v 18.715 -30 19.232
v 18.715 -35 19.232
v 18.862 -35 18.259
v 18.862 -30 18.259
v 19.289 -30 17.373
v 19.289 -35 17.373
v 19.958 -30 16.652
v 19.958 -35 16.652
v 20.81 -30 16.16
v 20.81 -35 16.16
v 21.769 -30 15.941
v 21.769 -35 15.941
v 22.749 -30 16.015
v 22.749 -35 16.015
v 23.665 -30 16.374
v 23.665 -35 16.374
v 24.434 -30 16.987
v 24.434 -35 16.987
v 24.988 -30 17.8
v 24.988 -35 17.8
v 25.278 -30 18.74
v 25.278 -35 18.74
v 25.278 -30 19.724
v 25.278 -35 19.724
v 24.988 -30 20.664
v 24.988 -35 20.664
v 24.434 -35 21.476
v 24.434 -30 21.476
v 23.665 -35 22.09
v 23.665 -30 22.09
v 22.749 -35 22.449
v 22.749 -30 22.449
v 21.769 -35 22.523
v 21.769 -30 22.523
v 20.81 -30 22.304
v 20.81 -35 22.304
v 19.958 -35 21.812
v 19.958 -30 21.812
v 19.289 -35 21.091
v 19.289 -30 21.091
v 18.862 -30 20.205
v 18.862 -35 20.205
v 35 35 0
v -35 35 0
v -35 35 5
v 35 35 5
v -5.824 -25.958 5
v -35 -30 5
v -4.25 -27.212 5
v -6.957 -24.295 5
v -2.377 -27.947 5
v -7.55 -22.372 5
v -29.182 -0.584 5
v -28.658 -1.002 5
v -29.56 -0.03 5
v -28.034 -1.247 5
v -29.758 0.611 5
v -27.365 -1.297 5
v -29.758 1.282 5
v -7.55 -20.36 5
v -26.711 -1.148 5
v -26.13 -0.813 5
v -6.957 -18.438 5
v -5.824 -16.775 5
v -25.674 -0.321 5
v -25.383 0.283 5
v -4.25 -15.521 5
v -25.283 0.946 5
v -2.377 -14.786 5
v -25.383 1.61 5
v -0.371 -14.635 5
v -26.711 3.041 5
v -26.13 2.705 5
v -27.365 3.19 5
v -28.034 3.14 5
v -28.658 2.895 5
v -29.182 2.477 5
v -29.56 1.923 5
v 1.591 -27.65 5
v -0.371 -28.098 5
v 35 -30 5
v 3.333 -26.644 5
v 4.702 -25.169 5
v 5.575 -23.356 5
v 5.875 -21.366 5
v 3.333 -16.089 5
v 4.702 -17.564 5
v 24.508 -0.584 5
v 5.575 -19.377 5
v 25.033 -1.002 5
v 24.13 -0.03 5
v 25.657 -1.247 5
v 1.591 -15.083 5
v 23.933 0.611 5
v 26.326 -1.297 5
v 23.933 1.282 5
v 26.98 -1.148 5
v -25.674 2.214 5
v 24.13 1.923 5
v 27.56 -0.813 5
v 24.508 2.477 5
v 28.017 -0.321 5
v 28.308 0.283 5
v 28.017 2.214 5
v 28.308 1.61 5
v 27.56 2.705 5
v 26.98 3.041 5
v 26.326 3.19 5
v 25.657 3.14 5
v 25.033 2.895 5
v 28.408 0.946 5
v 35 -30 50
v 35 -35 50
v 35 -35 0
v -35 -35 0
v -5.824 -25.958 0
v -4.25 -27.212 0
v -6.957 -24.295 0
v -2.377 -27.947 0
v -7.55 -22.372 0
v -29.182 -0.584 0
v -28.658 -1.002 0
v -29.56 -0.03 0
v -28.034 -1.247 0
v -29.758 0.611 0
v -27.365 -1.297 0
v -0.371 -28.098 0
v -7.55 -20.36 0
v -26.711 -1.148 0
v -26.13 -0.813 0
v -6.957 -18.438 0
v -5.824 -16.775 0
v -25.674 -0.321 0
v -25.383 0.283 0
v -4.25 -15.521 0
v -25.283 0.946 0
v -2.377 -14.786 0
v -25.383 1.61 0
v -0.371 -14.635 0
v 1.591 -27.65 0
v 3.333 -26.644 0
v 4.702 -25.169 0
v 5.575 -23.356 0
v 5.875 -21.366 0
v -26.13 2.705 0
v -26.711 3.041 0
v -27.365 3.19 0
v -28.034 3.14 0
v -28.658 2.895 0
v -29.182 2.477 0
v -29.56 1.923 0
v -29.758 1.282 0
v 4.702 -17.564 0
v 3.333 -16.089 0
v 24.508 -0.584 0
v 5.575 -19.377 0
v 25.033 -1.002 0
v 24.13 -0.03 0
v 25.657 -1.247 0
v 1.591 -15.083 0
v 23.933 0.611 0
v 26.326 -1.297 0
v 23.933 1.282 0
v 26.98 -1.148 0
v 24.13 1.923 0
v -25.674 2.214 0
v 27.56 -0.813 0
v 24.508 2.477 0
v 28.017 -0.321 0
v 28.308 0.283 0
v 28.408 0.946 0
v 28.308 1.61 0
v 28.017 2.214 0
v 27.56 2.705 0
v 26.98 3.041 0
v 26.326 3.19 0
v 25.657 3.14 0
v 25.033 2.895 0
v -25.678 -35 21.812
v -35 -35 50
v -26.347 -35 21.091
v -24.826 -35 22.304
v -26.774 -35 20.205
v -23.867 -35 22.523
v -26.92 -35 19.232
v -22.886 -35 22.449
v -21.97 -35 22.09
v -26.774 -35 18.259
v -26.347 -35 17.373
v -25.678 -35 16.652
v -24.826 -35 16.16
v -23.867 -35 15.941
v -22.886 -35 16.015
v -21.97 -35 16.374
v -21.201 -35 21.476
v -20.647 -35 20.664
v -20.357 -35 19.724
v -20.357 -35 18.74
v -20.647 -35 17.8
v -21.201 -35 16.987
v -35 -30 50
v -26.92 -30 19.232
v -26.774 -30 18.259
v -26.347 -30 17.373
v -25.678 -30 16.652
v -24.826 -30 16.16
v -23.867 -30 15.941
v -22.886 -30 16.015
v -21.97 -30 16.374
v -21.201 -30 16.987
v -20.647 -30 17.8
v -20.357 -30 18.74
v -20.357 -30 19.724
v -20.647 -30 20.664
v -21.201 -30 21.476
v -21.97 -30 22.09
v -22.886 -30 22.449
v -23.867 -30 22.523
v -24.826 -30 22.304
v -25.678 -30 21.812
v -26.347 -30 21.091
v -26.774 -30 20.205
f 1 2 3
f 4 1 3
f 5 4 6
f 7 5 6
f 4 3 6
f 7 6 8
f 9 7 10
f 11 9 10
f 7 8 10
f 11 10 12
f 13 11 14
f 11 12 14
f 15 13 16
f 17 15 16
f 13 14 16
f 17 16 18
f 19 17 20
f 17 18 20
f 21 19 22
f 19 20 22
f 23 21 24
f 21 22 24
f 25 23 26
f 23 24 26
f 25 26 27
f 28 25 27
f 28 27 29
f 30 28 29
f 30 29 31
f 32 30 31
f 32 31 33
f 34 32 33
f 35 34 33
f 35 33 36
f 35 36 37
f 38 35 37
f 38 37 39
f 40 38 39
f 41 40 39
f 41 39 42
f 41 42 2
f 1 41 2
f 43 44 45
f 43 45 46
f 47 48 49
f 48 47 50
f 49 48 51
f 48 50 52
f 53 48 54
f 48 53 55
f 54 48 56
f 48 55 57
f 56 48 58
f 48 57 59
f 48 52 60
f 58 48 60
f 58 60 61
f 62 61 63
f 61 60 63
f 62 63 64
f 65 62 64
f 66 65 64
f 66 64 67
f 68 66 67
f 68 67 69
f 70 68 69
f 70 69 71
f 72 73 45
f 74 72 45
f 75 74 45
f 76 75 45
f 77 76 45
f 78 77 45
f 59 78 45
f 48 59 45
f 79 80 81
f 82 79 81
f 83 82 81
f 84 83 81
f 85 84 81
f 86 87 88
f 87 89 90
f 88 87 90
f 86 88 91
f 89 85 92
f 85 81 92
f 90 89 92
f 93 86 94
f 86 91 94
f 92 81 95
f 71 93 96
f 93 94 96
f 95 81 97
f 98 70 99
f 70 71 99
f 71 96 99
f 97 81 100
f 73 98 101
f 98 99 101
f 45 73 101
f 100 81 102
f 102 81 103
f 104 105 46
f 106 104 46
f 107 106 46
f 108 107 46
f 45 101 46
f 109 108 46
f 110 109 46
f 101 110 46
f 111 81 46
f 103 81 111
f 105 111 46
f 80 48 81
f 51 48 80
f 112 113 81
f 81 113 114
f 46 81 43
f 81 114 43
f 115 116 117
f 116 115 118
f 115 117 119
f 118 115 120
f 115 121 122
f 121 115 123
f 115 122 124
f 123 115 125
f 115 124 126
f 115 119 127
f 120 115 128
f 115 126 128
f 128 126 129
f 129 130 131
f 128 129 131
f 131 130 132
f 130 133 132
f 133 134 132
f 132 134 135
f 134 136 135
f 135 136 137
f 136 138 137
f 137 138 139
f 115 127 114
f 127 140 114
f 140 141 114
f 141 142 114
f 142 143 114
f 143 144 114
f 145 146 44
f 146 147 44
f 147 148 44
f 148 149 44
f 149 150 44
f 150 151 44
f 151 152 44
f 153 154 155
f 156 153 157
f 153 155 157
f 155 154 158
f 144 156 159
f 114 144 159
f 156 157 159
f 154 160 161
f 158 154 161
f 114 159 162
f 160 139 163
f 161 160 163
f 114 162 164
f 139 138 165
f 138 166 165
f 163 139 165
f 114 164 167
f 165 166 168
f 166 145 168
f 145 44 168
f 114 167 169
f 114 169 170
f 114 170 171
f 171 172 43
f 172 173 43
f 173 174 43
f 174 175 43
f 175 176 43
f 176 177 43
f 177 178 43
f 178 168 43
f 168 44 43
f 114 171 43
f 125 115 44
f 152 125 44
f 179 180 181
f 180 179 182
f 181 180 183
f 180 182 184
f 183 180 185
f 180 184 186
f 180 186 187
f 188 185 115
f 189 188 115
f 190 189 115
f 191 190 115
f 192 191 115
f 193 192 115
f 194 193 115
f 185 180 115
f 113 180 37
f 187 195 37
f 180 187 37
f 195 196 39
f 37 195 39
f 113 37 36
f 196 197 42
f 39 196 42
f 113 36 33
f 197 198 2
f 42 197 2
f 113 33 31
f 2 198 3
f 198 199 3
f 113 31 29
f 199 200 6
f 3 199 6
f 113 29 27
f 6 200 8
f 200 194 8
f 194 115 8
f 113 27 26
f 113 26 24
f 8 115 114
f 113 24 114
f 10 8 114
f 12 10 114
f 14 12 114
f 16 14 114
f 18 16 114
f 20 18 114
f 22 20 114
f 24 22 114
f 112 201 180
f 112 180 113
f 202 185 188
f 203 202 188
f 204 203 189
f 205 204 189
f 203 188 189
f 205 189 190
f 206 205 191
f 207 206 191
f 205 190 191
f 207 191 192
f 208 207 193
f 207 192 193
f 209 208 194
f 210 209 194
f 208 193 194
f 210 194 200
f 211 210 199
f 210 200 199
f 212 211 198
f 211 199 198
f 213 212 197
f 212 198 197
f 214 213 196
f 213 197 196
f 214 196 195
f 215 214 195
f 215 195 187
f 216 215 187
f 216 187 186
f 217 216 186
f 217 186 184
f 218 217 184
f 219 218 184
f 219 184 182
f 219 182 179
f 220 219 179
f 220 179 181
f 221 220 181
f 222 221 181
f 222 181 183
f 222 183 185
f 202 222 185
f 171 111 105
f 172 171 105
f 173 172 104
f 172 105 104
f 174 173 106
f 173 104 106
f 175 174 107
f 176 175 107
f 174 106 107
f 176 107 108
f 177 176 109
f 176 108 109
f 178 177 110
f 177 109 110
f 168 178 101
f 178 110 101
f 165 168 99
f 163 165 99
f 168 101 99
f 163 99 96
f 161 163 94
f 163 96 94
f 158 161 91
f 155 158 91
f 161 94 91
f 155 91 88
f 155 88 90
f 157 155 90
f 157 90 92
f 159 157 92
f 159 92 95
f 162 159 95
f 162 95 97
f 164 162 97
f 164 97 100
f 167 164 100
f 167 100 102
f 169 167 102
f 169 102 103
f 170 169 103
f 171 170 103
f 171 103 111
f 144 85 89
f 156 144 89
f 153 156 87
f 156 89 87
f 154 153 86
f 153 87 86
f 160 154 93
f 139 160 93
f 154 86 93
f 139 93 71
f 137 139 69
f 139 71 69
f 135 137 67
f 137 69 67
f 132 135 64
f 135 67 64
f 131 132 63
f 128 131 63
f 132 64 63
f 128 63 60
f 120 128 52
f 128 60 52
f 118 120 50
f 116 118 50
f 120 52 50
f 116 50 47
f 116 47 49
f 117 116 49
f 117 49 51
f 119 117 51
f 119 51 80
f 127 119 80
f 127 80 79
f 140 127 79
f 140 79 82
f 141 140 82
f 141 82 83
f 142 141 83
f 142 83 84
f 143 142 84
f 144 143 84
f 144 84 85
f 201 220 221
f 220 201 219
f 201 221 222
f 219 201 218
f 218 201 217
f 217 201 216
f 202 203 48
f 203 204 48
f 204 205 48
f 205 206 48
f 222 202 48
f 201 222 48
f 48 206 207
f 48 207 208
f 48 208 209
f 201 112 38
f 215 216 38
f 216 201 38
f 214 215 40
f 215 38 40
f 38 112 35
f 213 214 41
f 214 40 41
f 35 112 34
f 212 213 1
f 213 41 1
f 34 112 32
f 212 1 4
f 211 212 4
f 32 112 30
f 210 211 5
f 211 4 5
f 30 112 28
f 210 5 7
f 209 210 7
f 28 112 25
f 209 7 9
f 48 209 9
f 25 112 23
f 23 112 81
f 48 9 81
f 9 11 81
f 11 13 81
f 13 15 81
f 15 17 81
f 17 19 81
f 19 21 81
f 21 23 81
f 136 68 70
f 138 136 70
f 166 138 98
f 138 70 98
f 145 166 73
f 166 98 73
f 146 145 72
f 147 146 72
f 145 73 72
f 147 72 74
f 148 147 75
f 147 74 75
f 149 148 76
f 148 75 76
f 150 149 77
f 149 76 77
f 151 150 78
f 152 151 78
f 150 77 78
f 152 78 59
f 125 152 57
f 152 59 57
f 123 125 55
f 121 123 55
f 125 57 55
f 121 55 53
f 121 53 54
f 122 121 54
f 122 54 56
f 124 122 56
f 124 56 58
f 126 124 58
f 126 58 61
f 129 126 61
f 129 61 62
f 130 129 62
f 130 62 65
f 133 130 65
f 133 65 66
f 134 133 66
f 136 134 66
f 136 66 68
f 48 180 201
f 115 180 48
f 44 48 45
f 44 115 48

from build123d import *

# Parameters (mm, degrees)
ESQUISSE1_W             = 70
ESQUISSE1_H             = 70
BOSS_EXTRU_1_DEPTH      = 50
ESQUISSE2_W             = 123.137615707
ESQUISSE2_H             = 86.86411441
ENL_V_MAT_EXTRU_1_DEPTH = 217
D_GAGEMENT_M41_D        = 4.5
D_GAGEMENT_M121_D       = 13.5
D_GAGEMENT_M61_D        = 6.6


with BuildPart() as part:
    # Esquisse1 → Boss.-Extru.1 (new body)
    with BuildSketch(Plane.XY):
        Rectangle(ESQUISSE1_W, ESQUISSE1_H)
    extrude(amount=BOSS_EXTRU_1_DEPTH)

    # Esquisse2 → Enlèv. mat.-Extru.1 (cut)
    with BuildSketch(Plane(origin=(35, 0, 0), x_dir=(0, 0, -1), z_dir=(1, 0, 0))):
        with Locations((-66.568807854, 13.432057205)):
            Rectangle(ESQUISSE2_W, ESQUISSE2_H)
    extrude(amount=-ENL_V_MAT_EXTRU_1_DEPTH, mode=Mode.SUBTRACT)

    # Dégagement M41 (through all)
    with Locations(Plane(origin=(0, 0, 0), x_dir=(-1, 0, 0), z_dir=(0, 0, -1))):
        with Locations((-26.157577905, 0.946358973), (27.533117647, 0.946358973)):
            Hole(D_GAGEMENT_M41_D / 2)

    # Dégagement M121 (through all)
    with Locations(Plane(origin=(0, 0, 0), x_dir=(-1, 0, 0), z_dir=(0, 0, -1))):
        with Locations((0.875458958, -21.366395267)):
            Hole(D_GAGEMENT_M121_D / 2)

    # Dégagement M61 (through all)
    with Locations(Plane(origin=(0, -30, 0), x_dir=(1, 0, 0), z_dir=(0, 1, 0))):
        with Locations((-23.62027619, -19.231813592), (22.015174003, -19.231813592)):
            Hole(D_GAGEMENT_M61_D / 2)


solid = part.part
